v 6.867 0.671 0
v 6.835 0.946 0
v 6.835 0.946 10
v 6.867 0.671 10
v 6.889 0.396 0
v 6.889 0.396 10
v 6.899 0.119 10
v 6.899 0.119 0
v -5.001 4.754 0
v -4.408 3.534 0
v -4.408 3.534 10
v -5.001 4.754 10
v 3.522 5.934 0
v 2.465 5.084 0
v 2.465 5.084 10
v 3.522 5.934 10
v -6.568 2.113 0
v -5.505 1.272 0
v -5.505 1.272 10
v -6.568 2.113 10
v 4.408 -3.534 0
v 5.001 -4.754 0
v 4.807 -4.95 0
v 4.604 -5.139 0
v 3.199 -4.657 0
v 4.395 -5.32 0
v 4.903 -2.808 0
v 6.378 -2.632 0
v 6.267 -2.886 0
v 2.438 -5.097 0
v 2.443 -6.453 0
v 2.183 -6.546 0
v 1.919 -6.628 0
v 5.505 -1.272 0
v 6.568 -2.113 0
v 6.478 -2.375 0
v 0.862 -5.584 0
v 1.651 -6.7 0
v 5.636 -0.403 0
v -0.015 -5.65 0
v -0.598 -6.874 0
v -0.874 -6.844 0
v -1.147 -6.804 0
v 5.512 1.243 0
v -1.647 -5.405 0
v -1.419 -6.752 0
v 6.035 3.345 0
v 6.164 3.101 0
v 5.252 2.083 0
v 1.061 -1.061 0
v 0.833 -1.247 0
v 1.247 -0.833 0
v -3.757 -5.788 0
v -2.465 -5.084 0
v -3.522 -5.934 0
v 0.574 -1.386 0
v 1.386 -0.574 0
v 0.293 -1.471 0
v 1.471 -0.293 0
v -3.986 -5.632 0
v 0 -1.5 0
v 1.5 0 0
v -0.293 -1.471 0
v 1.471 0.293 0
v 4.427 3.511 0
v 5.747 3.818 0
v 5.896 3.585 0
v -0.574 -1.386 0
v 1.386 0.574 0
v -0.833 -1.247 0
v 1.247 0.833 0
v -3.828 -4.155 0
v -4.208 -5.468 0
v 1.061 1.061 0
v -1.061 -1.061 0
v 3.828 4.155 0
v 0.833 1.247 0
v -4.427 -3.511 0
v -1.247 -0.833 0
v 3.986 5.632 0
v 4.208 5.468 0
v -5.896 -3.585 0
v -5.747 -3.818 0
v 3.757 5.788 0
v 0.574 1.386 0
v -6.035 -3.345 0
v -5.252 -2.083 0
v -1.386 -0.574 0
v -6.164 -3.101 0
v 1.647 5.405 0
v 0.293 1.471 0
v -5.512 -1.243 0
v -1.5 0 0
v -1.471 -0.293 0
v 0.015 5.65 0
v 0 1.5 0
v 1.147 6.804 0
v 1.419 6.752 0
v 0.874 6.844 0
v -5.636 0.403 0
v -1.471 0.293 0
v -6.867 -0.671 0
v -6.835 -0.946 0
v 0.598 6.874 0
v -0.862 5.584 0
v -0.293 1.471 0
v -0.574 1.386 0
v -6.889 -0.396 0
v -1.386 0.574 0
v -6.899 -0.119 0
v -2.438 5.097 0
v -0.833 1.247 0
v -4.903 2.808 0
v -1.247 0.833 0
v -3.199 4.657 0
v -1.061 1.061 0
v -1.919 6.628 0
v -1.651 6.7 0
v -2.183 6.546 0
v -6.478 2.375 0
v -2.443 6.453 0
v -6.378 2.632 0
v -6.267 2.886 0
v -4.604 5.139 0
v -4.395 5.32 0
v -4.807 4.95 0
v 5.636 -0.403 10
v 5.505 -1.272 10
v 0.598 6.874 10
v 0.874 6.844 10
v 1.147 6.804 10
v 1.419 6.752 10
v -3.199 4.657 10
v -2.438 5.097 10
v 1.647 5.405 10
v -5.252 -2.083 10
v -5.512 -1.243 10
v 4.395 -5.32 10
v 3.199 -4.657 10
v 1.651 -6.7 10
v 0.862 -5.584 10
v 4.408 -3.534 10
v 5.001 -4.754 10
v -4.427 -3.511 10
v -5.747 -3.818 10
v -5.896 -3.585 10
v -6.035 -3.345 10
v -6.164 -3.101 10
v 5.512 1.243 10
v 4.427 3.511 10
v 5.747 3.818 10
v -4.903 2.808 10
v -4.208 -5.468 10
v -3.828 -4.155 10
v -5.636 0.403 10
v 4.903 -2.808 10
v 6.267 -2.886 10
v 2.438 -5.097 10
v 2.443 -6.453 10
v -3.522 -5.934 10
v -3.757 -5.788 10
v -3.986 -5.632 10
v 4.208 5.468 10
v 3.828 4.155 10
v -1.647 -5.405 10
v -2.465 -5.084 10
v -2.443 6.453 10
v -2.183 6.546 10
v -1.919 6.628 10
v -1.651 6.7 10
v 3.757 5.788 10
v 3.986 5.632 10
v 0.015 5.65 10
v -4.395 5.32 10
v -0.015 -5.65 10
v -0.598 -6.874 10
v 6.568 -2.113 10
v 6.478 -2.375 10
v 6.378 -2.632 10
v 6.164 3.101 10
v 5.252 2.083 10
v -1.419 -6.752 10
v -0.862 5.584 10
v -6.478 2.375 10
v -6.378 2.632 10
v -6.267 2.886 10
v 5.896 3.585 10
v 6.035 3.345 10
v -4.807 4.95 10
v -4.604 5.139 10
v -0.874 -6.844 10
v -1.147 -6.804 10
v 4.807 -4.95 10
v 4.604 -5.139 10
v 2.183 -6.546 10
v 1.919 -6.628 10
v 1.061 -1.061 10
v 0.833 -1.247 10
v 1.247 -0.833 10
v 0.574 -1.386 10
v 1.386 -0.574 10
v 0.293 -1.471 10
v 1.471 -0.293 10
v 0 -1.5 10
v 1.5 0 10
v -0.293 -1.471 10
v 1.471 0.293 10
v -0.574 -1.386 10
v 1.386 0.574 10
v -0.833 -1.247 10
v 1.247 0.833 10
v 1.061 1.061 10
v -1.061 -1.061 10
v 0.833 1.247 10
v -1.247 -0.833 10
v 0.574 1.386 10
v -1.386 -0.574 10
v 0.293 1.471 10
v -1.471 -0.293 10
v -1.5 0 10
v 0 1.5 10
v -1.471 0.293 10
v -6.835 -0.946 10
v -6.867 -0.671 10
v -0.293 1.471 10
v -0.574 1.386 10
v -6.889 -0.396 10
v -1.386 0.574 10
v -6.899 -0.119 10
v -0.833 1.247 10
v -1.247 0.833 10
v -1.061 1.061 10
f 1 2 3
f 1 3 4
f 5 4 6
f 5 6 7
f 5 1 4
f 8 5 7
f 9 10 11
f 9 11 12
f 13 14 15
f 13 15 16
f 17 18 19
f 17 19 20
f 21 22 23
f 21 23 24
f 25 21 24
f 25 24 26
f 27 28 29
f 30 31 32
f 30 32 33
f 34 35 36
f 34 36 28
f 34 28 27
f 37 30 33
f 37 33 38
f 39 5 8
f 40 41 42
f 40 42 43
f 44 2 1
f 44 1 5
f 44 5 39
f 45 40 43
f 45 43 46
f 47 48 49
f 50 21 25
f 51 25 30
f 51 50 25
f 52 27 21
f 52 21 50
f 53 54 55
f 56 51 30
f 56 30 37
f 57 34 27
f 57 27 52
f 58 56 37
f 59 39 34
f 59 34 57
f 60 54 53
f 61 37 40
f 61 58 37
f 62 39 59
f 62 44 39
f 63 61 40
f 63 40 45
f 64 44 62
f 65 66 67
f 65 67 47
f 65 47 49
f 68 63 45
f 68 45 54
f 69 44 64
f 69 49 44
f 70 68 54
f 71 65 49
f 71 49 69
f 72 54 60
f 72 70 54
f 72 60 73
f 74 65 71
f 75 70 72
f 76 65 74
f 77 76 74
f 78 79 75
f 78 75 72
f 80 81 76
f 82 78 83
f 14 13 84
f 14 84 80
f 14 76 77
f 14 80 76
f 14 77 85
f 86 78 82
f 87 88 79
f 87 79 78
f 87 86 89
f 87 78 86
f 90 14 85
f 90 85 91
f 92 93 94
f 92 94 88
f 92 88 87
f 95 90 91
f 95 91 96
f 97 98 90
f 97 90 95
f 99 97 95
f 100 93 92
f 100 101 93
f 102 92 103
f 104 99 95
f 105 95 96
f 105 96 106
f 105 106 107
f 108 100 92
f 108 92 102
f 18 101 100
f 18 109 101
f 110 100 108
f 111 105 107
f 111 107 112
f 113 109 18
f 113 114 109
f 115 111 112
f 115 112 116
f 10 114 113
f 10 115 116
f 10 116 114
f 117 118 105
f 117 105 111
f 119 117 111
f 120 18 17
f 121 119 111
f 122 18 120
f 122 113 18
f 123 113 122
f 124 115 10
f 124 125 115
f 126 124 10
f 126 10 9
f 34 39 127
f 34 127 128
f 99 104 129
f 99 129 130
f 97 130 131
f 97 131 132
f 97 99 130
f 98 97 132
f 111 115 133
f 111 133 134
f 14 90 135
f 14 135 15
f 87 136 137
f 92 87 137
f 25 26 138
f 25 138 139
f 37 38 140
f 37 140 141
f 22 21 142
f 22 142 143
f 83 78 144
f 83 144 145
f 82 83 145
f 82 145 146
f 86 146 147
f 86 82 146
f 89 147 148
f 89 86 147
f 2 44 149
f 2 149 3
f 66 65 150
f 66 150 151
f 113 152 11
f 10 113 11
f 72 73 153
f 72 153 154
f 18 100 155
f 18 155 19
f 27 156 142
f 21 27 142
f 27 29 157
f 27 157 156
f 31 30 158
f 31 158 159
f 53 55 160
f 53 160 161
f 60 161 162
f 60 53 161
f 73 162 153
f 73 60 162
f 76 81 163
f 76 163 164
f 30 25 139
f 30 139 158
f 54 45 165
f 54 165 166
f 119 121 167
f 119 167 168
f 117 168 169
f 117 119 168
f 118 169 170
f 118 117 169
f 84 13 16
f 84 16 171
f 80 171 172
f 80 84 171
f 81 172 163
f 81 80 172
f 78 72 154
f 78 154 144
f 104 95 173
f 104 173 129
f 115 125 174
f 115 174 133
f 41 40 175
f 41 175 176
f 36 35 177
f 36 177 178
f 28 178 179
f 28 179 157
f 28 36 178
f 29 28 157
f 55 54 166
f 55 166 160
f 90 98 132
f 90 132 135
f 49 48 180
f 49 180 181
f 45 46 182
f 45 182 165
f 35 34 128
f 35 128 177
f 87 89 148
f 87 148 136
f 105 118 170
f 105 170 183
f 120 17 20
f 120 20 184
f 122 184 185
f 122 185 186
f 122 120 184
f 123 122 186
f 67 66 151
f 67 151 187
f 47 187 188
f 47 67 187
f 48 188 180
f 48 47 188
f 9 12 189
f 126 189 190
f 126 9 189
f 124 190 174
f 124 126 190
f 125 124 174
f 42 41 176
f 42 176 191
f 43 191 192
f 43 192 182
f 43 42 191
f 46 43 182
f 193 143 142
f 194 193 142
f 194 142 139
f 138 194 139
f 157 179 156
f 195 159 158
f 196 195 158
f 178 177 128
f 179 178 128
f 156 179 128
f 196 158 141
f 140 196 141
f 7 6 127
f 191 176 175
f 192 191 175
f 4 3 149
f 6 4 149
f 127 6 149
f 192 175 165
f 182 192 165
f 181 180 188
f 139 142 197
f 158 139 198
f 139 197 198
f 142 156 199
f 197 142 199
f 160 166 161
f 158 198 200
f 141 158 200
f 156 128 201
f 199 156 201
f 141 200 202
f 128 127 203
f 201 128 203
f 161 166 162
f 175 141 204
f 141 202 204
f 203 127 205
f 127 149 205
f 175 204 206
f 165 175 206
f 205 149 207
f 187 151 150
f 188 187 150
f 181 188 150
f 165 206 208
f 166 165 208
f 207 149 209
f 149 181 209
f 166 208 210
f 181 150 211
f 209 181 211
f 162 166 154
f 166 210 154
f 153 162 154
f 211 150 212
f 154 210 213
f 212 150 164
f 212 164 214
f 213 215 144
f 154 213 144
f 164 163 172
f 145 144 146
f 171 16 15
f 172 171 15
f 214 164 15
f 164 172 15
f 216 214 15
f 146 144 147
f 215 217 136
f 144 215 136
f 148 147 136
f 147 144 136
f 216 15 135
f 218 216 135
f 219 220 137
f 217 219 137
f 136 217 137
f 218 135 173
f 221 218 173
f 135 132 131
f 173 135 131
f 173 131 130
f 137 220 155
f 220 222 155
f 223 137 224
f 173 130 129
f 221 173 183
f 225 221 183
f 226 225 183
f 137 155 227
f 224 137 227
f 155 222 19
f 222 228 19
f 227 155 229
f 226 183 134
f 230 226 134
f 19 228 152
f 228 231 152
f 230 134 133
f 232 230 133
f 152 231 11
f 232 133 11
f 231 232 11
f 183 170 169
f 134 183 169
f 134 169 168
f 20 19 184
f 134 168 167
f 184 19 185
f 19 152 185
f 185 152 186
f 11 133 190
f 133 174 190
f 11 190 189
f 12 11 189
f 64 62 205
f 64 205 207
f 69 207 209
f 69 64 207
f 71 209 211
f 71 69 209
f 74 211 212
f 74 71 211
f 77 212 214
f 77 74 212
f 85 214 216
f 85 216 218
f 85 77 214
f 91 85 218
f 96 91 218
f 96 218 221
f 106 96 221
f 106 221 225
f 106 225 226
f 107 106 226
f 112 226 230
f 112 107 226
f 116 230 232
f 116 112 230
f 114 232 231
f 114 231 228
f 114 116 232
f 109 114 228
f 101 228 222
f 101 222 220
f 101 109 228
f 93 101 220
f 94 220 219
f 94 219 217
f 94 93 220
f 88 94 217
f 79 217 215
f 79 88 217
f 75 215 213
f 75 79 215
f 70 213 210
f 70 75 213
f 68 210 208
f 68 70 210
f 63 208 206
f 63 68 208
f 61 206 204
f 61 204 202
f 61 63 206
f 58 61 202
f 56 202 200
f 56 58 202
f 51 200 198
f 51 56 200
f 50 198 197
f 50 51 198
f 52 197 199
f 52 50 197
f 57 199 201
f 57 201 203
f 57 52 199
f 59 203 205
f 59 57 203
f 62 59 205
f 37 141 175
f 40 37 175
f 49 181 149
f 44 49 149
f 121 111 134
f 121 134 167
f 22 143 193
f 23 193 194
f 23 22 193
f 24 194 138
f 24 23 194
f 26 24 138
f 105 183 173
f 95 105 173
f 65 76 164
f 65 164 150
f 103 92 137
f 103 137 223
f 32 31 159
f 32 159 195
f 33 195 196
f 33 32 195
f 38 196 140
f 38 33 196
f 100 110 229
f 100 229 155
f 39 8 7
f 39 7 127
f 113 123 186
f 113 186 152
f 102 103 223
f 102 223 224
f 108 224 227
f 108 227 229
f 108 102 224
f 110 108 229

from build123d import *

# Parameters (mm, degrees)
SKETCH1_R           = 1.5
BOSS_EXTRUDE1_DEPTH = 10


with BuildPart() as part:
    # Sketch1 → Boss-Extrude1 (new body)
    with BuildSketch(Plane.XY):
        with BuildLine():
            Line((-2.438077779, 5.096888928), (-2.443359795, 6.452905773))
            ThreePointArc((-2.443359795, 6.452905773), (-2.051006224, 6.588123668), (-1.65123331, 6.699509576))
            Line((-1.65123331, 6.699509576), (-0.861593933, 5.583919403))
            Line((-0.861593933, 5.583919403), (0.01482505, 5.64998055))
            Line((0.01482505, 5.64998055), (0.598419776, 6.874001293))
            ThreePointArc((0.598419776, 6.874001293), (1.010586975, 6.825592573), (1.419098459, 6.752492841))
            Line((1.419098459, 6.752492841), (1.646502519, 5.40476914))
            Line((1.646502519, 5.40476914), (2.464791596, 5.084024232))
            Line((2.464791596, 5.084024232), (3.521674972, 5.933616552))
            ThreePointArc((3.521674972, 5.933616552), (3.87202103, 5.711169157), (4.208360374, 5.468062084))
            Line((4.208360374, 5.468062084), (3.828488954, 4.155138064))
            Line((3.828488954, 4.155138064), (4.426575937, 3.511114563))
            Line((4.426575937, 3.511114563), (5.747419249, 3.818006283))
            ThreePointArc((5.747419249, 3.818006283), (5.966553832, 3.465578648), (6.164104905, 3.100614571))
            Line((6.164104905, 3.100614571), (5.252196198, 2.082530934))
            Line((5.252196198, 2.082530934), (5.511622626, 1.242785594))
            Line((5.511622626, 1.242785594), (6.834816656, 0.946193044))
            ThreePointArc((6.834816656, 0.946193044), (6.879337474, 0.533587785), (6.898972862, 0.119052315))
            Line((6.898972862, 0.119052315), (5.635641572, -0.402546987))
            Line((5.635641572, -0.402546987), (5.505024858, -1.271692304))
            Line((5.505024858, -1.271692304), (6.568494801, -2.113025331))
            ThreePointArc((6.568494801, -2.113025331), (6.429583959, -2.504086684), (6.267414633, -2.886089711))
            Line((6.267414633, -2.886089711), (4.902879015, -2.80789554))
            Line((4.902879015, -2.80789554), (4.408089402, -3.534295945))
            Line((4.408089402, -3.534295945), (5.001201993, -4.753733125))
            ThreePointArc((5.001201993, -4.753733125), (4.706372487, -5.045796073), (4.394518071, -5.319606275))
            Line((4.394518071, -5.319606275), (3.199041139, -4.657105946))
            Line((3.199041139, -4.657105946), (2.438077779, -5.096888928))
            Line((2.438077779, -5.096888928), (2.443359795, -6.452905773))
            ThreePointArc((2.443359795, -6.452905773), (2.051006224, -6.588123668), (1.65123331, -6.699509576))
            Line((1.65123331, -6.699509576), (0.861593933, -5.583919403))
            Line((0.861593933, -5.583919403), (-0.01482505, -5.64998055))
            Line((-0.01482505, -5.64998055), (-0.598419776, -6.874001293))
            ThreePointArc((-0.598419776, -6.874001293), (-1.010586975, -6.825592573), (-1.419098459, -6.752492841))
            Line((-1.419098459, -6.752492841), (-1.646502519, -5.40476914))
            Line((-1.646502519, -5.40476914), (-2.464791596, -5.084024232))
            Line((-2.464791596, -5.084024232), (-3.521674972, -5.933616552))
            ThreePointArc((-3.521674972, -5.933616552), (-3.87202103, -5.711169157), (-4.208360374, -5.468062084))
            Line((-4.208360374, -5.468062084), (-3.828488954, -4.155138064))
            Line((-3.828488954, -4.155138064), (-4.426575937, -3.511114563))
            Line((-4.426575937, -3.511114563), (-5.747419249, -3.818006283))
            ThreePointArc((-5.747419249, -3.818006283), (-5.966553832, -3.465578648), (-6.164104905, -3.100614571))
            Line((-6.164104905, -3.100614571), (-5.252196198, -2.082530934))
            Line((-5.252196198, -2.082530934), (-5.511622626, -1.242785594))
            Line((-5.511622626, -1.242785594), (-6.834816656, -0.946193044))
            ThreePointArc((-6.834816656, -0.946193044), (-6.879337474, -0.533587785), (-6.898972862, -0.119052315))
            Line((-6.898972862, -0.119052315), (-5.635641572, 0.402546987))
            Line((-5.635641572, 0.402546987), (-5.505024858, 1.271692304))
            Line((-5.505024858, 1.271692304), (-6.568494801, 2.113025331))
            ThreePointArc((-6.568494801, 2.113025331), (-6.429583959, 2.504086684), (-6.267414633, 2.886089711))
            Line((-6.267414633, 2.886089711), (-4.902879015, 2.80789554))
            Line((-4.902879015, 2.80789554), (-4.408089402, 3.534295945))
            Line((-4.408089402, 3.534295945), (-5.001201993, 4.753733125))
            ThreePointArc((-5.001201993, 4.753733125), (-4.706372487, 5.045796073), (-4.394518071, 5.319606275))
            Line((-4.394518071, 5.319606275), (-3.199041139, 4.657105946))
            Line((-3.199041139, 4.657105946), (-2.438077779, 5.096888928))
        make_face()
        Circle(SKETCH1_R, mode=Mode.SUBTRACT)
    extrude(amount=BOSS_EXTRUDE1_DEPTH)


solid = part.part
